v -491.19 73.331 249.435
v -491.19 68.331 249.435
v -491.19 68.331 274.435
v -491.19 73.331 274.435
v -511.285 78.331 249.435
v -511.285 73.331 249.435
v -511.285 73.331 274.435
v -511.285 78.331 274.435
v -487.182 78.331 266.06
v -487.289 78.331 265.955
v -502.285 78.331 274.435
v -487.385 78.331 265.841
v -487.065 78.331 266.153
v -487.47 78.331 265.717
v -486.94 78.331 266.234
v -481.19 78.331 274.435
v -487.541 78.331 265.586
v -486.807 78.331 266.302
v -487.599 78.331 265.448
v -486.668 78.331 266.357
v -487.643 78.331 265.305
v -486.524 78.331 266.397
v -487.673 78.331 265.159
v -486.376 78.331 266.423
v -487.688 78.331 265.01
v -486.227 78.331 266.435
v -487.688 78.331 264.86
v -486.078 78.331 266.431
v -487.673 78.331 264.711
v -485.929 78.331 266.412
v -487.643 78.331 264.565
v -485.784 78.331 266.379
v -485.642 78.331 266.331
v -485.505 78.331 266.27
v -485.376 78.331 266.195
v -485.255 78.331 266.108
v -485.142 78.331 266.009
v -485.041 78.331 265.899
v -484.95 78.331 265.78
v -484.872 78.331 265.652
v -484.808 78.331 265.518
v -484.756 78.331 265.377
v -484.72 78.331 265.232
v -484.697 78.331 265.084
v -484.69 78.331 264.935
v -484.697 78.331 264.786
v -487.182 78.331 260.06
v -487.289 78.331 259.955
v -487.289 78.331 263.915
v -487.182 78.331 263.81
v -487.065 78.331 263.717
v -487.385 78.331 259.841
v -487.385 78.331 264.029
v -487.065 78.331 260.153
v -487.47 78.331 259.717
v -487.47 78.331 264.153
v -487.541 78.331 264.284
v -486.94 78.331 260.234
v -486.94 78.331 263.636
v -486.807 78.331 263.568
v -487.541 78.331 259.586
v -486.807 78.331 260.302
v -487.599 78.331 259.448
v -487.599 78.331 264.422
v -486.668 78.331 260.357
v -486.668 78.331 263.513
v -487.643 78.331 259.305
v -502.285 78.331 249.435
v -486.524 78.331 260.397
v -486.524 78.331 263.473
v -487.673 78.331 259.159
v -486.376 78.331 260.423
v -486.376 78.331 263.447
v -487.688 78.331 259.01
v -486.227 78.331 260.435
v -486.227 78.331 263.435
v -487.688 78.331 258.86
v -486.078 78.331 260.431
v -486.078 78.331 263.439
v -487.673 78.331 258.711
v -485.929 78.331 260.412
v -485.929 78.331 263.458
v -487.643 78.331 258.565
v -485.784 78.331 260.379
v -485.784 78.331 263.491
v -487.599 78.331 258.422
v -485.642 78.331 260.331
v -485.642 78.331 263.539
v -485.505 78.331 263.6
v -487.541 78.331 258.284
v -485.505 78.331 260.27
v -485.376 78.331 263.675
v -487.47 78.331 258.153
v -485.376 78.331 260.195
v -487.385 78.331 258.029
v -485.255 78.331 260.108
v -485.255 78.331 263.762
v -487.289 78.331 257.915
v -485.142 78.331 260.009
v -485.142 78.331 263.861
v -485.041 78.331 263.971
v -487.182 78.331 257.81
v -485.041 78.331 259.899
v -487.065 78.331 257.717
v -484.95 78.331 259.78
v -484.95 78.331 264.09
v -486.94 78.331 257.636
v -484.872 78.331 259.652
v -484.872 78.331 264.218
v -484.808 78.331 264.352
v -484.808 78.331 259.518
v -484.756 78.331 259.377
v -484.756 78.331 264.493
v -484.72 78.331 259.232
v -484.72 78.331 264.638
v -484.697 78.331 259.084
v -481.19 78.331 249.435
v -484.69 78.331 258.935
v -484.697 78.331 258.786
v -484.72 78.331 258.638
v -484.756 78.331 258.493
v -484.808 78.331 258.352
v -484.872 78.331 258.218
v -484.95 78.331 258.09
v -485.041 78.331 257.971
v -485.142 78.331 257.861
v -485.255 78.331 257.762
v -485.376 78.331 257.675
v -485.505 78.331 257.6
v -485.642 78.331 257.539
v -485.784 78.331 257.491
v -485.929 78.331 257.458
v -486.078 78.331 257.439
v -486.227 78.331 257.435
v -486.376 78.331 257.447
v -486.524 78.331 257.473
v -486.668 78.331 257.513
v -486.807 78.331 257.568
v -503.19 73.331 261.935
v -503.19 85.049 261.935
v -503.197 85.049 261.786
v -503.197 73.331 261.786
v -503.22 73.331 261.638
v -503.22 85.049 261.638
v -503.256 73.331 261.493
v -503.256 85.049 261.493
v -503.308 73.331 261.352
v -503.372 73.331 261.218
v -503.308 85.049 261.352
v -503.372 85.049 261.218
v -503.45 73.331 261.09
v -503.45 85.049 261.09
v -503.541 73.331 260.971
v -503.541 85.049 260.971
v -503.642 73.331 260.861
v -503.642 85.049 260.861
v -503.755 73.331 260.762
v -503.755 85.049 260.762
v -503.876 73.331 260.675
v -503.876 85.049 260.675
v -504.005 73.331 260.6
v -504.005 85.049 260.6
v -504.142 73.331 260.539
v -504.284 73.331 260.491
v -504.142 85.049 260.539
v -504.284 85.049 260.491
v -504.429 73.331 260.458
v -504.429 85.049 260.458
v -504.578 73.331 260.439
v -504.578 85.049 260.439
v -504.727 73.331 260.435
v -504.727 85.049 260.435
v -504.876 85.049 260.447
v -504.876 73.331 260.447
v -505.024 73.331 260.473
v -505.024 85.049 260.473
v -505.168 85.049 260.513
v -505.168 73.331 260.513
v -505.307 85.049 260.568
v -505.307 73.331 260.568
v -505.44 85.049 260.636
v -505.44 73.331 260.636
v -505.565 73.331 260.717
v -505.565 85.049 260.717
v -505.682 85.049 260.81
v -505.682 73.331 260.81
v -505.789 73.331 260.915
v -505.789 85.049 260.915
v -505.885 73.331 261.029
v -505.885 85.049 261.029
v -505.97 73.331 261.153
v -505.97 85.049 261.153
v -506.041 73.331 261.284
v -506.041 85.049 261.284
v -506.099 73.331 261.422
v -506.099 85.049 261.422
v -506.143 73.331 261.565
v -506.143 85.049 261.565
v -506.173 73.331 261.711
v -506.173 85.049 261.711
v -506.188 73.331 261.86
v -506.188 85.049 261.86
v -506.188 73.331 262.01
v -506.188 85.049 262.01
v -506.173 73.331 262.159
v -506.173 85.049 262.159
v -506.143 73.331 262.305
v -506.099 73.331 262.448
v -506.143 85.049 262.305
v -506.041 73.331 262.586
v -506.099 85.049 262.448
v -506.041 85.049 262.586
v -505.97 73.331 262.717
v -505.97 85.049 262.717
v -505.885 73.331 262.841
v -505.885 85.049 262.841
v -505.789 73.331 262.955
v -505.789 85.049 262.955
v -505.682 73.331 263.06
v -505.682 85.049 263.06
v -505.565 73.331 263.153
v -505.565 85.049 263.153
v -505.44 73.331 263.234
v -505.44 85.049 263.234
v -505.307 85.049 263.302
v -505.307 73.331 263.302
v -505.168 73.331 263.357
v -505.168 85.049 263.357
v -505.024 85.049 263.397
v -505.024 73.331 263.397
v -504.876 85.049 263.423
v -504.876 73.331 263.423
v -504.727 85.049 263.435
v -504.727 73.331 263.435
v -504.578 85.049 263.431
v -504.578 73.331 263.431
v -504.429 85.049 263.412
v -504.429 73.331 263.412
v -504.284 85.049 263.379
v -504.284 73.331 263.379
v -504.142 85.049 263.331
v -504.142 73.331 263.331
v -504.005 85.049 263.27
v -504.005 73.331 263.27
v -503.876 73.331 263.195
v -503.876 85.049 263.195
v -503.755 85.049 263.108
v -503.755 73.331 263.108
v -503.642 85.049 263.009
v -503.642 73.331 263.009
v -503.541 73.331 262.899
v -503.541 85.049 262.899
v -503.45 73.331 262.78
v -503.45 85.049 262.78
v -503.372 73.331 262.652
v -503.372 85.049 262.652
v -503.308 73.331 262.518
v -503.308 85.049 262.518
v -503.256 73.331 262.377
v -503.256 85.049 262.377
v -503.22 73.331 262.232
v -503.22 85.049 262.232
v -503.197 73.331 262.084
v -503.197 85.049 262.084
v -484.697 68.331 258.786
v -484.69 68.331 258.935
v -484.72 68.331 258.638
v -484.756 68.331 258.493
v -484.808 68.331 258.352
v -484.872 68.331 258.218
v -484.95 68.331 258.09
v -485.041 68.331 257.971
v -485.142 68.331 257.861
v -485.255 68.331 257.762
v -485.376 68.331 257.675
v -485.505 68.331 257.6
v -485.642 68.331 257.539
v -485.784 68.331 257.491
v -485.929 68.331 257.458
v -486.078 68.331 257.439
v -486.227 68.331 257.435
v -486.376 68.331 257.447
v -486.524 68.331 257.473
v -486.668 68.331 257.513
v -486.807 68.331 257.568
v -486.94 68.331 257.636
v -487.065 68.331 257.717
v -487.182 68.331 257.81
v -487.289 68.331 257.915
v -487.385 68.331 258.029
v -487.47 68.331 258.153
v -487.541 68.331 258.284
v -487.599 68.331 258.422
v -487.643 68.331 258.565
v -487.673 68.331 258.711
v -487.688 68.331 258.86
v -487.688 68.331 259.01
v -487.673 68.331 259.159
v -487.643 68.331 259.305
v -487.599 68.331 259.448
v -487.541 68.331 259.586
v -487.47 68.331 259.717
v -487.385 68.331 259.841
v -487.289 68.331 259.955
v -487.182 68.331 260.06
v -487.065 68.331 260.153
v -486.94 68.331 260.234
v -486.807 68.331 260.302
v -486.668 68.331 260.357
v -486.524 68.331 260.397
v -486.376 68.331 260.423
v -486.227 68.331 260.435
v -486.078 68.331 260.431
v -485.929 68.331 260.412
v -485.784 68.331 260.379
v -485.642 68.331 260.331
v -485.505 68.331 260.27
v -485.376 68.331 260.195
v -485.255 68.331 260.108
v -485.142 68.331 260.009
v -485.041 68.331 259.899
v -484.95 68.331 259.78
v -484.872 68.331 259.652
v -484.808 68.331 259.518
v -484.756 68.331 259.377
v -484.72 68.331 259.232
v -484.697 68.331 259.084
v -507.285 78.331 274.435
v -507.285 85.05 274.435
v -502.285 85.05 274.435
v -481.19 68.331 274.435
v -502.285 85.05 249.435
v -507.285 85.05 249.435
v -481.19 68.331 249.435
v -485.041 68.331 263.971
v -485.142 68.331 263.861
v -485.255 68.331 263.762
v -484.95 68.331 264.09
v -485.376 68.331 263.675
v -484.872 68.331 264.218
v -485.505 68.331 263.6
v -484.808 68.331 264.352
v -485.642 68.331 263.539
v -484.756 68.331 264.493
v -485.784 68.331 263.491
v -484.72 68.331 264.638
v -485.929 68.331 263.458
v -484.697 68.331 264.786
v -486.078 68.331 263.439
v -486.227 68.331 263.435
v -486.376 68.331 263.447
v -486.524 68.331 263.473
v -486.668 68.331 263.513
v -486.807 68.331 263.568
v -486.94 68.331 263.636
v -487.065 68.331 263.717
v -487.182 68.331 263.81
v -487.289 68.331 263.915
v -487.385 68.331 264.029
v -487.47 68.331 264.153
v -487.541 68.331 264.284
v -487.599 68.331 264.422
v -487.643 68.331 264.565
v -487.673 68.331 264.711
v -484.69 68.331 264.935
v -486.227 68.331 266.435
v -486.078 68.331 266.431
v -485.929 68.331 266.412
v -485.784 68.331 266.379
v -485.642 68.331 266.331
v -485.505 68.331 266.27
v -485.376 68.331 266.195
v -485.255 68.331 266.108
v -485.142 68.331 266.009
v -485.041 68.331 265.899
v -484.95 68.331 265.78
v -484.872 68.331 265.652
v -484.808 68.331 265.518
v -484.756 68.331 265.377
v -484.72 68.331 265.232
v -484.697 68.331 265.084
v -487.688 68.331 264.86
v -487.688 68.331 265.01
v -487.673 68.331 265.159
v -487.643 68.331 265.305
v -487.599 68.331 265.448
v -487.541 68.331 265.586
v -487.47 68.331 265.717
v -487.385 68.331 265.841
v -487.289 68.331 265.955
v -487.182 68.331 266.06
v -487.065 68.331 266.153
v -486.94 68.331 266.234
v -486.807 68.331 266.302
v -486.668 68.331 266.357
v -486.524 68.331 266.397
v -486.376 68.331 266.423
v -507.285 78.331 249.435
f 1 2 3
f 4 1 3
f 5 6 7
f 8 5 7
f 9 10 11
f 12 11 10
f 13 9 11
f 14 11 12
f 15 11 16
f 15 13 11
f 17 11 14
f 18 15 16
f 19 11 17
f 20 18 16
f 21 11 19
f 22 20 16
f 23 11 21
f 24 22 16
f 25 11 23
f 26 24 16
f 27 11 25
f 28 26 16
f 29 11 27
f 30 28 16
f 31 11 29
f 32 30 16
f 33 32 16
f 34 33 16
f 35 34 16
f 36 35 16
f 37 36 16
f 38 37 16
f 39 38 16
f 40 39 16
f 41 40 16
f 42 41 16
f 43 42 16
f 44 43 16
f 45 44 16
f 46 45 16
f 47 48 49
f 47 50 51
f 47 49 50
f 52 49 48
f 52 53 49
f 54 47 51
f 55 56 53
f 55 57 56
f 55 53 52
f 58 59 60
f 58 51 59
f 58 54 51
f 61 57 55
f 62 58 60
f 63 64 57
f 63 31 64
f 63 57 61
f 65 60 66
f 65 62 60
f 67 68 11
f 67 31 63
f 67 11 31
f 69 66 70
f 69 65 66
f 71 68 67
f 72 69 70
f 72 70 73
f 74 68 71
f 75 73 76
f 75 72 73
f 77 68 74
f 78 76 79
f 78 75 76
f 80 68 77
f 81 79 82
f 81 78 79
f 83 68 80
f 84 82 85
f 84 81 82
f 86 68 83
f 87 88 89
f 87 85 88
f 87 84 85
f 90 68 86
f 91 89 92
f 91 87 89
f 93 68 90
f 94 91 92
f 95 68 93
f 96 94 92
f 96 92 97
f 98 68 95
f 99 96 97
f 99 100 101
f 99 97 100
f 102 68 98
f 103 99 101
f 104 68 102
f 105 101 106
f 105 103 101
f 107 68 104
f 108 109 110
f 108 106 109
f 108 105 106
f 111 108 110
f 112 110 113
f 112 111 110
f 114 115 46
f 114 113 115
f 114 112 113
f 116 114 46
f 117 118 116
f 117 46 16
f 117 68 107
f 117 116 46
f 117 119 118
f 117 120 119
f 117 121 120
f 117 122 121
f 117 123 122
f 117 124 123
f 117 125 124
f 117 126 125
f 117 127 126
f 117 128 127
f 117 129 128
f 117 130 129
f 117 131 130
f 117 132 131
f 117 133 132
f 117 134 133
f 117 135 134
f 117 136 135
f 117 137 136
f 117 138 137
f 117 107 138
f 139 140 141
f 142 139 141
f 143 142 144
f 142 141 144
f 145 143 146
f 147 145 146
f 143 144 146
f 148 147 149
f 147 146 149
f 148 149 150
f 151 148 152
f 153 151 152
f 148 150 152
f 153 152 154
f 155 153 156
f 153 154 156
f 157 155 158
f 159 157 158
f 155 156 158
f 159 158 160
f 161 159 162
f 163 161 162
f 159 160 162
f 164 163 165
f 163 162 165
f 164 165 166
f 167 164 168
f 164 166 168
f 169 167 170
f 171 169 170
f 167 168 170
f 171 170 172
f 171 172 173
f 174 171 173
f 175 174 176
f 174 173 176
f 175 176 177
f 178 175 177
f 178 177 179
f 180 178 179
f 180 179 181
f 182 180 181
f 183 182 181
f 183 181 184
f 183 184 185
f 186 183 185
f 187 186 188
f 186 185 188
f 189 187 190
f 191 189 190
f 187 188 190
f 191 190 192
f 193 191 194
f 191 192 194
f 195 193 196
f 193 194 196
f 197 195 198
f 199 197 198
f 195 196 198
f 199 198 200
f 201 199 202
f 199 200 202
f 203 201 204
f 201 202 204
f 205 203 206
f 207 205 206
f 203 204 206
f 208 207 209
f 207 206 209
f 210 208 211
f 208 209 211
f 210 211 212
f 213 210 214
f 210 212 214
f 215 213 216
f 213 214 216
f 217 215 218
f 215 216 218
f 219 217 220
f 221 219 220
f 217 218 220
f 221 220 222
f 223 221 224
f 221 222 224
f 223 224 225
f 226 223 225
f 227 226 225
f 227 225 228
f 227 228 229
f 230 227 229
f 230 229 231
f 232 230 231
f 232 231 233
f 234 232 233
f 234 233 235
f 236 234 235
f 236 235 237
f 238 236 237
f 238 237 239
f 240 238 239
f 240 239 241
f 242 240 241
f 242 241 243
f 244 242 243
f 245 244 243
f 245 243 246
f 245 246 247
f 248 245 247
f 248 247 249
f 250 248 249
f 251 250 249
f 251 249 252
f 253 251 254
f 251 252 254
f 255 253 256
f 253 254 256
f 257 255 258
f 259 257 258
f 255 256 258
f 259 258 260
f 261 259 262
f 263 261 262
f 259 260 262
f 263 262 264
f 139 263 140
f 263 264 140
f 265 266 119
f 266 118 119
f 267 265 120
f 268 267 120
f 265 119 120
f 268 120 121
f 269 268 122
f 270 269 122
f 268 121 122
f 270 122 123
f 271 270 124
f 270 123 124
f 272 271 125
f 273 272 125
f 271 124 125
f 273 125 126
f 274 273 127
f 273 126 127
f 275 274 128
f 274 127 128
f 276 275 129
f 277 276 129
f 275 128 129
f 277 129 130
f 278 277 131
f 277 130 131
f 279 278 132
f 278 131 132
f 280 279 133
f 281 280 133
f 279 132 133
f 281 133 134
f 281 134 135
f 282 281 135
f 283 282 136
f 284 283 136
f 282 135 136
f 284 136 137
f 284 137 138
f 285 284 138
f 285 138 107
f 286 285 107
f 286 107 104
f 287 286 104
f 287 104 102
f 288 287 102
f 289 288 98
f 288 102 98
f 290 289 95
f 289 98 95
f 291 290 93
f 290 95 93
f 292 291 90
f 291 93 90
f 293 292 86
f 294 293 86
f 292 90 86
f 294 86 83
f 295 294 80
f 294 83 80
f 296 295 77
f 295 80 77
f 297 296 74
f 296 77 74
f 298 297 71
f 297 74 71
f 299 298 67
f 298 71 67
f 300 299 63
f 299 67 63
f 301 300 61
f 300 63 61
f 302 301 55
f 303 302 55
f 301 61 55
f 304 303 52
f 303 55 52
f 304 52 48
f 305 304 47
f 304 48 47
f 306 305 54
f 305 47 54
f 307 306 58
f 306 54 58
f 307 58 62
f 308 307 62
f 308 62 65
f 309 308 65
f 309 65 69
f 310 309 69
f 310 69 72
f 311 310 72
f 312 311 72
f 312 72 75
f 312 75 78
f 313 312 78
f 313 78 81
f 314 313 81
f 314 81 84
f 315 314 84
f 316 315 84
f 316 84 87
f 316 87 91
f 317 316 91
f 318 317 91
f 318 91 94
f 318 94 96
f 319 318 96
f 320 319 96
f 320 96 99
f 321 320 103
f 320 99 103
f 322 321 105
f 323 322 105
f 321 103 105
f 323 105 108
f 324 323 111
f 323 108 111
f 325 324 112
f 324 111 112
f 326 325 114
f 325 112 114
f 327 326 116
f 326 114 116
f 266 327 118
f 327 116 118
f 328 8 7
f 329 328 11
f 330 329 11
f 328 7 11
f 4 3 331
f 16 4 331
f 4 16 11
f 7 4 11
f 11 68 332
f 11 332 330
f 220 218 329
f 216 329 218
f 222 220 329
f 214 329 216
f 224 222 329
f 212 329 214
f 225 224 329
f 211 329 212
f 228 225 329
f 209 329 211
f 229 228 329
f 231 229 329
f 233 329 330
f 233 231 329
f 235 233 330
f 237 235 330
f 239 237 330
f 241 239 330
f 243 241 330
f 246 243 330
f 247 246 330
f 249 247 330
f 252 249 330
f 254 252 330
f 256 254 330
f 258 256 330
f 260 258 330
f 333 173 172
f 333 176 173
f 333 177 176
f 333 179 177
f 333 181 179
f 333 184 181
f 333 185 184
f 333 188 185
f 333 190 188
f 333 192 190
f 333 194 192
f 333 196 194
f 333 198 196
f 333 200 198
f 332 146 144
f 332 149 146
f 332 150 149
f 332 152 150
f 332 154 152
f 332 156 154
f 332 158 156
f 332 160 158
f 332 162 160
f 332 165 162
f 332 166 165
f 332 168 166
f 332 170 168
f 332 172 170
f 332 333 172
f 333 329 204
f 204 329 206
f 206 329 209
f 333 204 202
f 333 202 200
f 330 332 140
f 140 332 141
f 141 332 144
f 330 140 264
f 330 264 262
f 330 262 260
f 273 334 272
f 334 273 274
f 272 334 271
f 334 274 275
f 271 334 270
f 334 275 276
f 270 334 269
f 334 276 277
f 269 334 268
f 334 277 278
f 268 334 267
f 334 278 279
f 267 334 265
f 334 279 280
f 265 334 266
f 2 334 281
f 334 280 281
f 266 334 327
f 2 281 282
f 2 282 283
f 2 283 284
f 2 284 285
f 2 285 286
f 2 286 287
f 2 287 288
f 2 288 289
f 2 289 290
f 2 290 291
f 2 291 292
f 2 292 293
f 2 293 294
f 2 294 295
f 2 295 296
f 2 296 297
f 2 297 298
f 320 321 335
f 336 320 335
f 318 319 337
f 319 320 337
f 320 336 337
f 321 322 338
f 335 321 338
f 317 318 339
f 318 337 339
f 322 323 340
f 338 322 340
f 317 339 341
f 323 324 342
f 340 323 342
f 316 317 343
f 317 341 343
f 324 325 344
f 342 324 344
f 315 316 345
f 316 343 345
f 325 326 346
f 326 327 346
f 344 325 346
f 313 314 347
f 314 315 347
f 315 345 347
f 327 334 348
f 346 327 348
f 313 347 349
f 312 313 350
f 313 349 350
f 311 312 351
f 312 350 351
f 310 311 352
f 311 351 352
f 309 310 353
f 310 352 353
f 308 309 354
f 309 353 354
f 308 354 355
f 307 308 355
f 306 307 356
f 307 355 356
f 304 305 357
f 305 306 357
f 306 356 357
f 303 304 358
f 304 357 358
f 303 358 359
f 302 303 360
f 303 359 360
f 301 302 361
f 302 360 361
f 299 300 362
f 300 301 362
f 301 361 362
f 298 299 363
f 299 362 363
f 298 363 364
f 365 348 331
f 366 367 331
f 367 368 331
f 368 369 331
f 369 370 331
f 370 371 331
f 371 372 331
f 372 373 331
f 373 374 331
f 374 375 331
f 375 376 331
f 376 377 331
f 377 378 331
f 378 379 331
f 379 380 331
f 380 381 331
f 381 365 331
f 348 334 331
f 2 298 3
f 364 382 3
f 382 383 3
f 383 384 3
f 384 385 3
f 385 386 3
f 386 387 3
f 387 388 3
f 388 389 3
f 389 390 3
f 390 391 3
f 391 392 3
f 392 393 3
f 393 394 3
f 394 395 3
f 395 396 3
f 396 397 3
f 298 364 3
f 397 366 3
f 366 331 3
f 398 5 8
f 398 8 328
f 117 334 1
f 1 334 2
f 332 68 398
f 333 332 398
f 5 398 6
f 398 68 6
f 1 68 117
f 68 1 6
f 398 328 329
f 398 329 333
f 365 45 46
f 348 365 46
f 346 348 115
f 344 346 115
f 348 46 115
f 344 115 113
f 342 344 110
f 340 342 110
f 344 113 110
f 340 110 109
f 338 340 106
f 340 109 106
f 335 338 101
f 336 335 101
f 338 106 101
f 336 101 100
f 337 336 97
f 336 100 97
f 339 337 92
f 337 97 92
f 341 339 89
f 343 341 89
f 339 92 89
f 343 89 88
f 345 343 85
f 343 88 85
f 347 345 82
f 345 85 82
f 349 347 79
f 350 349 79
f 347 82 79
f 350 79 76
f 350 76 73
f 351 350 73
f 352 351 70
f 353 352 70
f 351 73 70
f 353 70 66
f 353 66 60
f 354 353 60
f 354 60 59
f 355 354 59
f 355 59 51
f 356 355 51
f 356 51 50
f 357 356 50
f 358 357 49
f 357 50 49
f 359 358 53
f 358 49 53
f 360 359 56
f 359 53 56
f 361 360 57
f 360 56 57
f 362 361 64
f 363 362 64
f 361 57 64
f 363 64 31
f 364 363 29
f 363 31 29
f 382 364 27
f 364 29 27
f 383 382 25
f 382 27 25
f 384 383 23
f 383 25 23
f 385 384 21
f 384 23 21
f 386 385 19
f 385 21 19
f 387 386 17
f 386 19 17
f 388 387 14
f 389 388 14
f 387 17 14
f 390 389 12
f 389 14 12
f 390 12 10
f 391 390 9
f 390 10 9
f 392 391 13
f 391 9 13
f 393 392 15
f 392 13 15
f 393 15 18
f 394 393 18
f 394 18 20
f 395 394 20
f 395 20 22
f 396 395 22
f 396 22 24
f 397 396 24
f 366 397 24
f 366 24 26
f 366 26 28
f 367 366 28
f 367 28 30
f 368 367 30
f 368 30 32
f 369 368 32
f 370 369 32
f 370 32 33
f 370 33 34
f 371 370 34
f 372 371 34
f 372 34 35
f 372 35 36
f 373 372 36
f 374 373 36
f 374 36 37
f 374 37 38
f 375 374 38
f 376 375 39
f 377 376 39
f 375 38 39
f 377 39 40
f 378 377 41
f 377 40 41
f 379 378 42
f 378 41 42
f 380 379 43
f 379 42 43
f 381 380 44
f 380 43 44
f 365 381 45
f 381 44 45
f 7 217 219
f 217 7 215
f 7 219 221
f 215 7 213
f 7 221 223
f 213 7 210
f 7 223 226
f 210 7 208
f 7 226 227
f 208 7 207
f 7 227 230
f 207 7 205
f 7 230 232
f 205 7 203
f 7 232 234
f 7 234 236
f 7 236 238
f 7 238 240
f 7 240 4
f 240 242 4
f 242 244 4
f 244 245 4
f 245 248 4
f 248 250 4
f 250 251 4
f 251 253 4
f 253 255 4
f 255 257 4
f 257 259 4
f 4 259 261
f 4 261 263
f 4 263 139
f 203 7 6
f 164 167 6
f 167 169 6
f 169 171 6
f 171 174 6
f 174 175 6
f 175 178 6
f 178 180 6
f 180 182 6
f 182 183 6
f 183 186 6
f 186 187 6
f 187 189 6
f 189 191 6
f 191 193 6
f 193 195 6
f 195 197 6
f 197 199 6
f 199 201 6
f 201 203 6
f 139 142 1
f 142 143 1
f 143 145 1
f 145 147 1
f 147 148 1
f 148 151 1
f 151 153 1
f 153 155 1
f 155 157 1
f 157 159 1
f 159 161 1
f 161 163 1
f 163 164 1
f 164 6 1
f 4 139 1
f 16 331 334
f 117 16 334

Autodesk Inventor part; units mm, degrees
ref_plane "YZ Plane" through (0, 0, 0) normal (1, 0, 0) x (0, 1, 0)
ref_plane "XZ Plane" through (0, 0, 0) normal (0, 1, 0) x (-1, 0, 0)
ref_plane "XY Plane" through (0, 0, 0) normal (0, 0, 1) x (1, 0, 0)
ref_plane "РабПлоскость1" through (-615.1898, 68.3314, 217.435) normal (0, 1, 0) x (-1, 0, 0)
sketch "Эскиз1" plane through (-615.1898, 68.3314, 217.435) normal (0, 1, 0) x (-1, 0, 0)
  circle A0 centre (-129, 47.5) radius 2 projected
  circle A1 centre (-129, 41.5) radius 2 projected
  line L0 (-129, 47.5) -> (-129, 41.5)
  line L1 (-134, 32) -> (-124, 32)
  line L2 (-124, 32) -> (-124, 57)
  line L3 (-124, 57) -> (-134, 57)
  line L4 (-134, 57) -> (-134, 32)
  line L5 (-134, 32) -> (-124, 57) construction
  line L6 (-124, 32) -> (-134, 57) construction
  point P0 (-615.1898, -217.435)
  point P1 (-129, 44.5)
  dimension "d0" = 25
  dimension "d1" = 10
extrude "Выдавливание1" add sketch "Эскиз1" along normal blind 5
sketch "Эскиз2" plane through (-615.1898, 73.3314, 217.435) normal (0, 1, 0) x (1, 0, 0)
  point P0 (615.1898, 217.435)
sketch "Эскиз3" plane through (-615.1898, 73.3314, 217.435) normal (0, 1, 0) x (1, 0, 0)
  point P0 (615.1898, 217.435)
sketch "Эскиз4" plane through (-615.1898, 73.3314, 217.435) normal (0, 1, 0) x (1, 0, 0)
  line L0 (134, -32) -> (124, -32) projected
  line L1 (134, -32) -> (103.9044, -32)
  line L2 (103.9044, -32) -> (103.9044, -57)
  line L3 (103.9044, -57) -> (134, -57)
  line L4 (134, -57) -> (134, -32)
  circle A0 centre (110.5, -44.5) radius 1.5 projected
  point P0 (615.1898, 217.435)
extrude "Выдавливание2" add sketch "Эскиз4" along normal blind 5
sketch "Эскиз5" plane through (-615.1898, 78.3314, 217.435) normal (0, 1, 0) x (1, 0, 0)
  line L0 (124, -32) -> (103.9044, -32) projected
  line L1 (103.9044, -57) -> (124, -57) projected
  line L2 (107.9044, -32) -> (112.9044, -32)
  line L3 (112.9044, -32) -> (112.9044, -57)
  line L4 (112.9044, -57) -> (107.9044, -57)
  line L5 (107.9044, -57) -> (107.9044, -32)
  line L6 (103.9044, -32) -> (103.9044, -57) projected
  point P0 (615.1898, 217.435)
  point P1 (107.9044, -57)
  point P2 (112.9044, -32)
  dimension "d6" = 4
  dimension "d7" = 5
extrude "Выдавливание3" add sketch "Эскиз5" along normal up to surface (6.7181 mm away) contours L3 L1 L5 L0
sketch "Эскиз6" plane through (-507.2854, 85.0494, 274.435) normal (0, 1, 0) x (1, 0, 0)
  circle A0 centre (2.5956, 12.5) radius 1.5 projected
  point P0 (507.2854, 274.435)
extrude "Выдавливание4" cut sketch "Эскиз6" against normal blind 17
sketch "Эскиз7" plane through (-615.1898, 68.3314, 217.435) normal (0, -1, 0) x (1, 0, 0)
  circle A0 centre (129, 41.5) radius 2
  circle A1 centre (129, 47.5) radius 2
  point P0 (615.1898, -217.435)
extrude "Выдавливание5" cut sketch "Эскиз7" against normal blind 14.5
sketch "Эскиз8" plane through (-615.1898, 78.3314, 217.435) normal (0, 1, 0) x (1, 0, 0)
  circle A0 centre (129, -41.5) radius 2 projected
  circle A1 centre (129, -47.5) radius 2 projected
  circle A2 centre (129, -41.5) radius 1.5
  circle A3 centre (129, -47.5) radius 1.5
  point P0 (615.1898, 217.435)
  dimension "d14" = 3
  dimension "d15" = 3
extrude "Выдавливание6" add sketch "Эскиз8" against normal up to surface (10 mm away)
sketch "Эскиз9" plane through (-507.2854, 85.0494, 274.435) normal (0, 1, 0) x (1, 0, 0)
  point P0 (507.2854, 274.435)
properties part number "крепление tcrt5000"
